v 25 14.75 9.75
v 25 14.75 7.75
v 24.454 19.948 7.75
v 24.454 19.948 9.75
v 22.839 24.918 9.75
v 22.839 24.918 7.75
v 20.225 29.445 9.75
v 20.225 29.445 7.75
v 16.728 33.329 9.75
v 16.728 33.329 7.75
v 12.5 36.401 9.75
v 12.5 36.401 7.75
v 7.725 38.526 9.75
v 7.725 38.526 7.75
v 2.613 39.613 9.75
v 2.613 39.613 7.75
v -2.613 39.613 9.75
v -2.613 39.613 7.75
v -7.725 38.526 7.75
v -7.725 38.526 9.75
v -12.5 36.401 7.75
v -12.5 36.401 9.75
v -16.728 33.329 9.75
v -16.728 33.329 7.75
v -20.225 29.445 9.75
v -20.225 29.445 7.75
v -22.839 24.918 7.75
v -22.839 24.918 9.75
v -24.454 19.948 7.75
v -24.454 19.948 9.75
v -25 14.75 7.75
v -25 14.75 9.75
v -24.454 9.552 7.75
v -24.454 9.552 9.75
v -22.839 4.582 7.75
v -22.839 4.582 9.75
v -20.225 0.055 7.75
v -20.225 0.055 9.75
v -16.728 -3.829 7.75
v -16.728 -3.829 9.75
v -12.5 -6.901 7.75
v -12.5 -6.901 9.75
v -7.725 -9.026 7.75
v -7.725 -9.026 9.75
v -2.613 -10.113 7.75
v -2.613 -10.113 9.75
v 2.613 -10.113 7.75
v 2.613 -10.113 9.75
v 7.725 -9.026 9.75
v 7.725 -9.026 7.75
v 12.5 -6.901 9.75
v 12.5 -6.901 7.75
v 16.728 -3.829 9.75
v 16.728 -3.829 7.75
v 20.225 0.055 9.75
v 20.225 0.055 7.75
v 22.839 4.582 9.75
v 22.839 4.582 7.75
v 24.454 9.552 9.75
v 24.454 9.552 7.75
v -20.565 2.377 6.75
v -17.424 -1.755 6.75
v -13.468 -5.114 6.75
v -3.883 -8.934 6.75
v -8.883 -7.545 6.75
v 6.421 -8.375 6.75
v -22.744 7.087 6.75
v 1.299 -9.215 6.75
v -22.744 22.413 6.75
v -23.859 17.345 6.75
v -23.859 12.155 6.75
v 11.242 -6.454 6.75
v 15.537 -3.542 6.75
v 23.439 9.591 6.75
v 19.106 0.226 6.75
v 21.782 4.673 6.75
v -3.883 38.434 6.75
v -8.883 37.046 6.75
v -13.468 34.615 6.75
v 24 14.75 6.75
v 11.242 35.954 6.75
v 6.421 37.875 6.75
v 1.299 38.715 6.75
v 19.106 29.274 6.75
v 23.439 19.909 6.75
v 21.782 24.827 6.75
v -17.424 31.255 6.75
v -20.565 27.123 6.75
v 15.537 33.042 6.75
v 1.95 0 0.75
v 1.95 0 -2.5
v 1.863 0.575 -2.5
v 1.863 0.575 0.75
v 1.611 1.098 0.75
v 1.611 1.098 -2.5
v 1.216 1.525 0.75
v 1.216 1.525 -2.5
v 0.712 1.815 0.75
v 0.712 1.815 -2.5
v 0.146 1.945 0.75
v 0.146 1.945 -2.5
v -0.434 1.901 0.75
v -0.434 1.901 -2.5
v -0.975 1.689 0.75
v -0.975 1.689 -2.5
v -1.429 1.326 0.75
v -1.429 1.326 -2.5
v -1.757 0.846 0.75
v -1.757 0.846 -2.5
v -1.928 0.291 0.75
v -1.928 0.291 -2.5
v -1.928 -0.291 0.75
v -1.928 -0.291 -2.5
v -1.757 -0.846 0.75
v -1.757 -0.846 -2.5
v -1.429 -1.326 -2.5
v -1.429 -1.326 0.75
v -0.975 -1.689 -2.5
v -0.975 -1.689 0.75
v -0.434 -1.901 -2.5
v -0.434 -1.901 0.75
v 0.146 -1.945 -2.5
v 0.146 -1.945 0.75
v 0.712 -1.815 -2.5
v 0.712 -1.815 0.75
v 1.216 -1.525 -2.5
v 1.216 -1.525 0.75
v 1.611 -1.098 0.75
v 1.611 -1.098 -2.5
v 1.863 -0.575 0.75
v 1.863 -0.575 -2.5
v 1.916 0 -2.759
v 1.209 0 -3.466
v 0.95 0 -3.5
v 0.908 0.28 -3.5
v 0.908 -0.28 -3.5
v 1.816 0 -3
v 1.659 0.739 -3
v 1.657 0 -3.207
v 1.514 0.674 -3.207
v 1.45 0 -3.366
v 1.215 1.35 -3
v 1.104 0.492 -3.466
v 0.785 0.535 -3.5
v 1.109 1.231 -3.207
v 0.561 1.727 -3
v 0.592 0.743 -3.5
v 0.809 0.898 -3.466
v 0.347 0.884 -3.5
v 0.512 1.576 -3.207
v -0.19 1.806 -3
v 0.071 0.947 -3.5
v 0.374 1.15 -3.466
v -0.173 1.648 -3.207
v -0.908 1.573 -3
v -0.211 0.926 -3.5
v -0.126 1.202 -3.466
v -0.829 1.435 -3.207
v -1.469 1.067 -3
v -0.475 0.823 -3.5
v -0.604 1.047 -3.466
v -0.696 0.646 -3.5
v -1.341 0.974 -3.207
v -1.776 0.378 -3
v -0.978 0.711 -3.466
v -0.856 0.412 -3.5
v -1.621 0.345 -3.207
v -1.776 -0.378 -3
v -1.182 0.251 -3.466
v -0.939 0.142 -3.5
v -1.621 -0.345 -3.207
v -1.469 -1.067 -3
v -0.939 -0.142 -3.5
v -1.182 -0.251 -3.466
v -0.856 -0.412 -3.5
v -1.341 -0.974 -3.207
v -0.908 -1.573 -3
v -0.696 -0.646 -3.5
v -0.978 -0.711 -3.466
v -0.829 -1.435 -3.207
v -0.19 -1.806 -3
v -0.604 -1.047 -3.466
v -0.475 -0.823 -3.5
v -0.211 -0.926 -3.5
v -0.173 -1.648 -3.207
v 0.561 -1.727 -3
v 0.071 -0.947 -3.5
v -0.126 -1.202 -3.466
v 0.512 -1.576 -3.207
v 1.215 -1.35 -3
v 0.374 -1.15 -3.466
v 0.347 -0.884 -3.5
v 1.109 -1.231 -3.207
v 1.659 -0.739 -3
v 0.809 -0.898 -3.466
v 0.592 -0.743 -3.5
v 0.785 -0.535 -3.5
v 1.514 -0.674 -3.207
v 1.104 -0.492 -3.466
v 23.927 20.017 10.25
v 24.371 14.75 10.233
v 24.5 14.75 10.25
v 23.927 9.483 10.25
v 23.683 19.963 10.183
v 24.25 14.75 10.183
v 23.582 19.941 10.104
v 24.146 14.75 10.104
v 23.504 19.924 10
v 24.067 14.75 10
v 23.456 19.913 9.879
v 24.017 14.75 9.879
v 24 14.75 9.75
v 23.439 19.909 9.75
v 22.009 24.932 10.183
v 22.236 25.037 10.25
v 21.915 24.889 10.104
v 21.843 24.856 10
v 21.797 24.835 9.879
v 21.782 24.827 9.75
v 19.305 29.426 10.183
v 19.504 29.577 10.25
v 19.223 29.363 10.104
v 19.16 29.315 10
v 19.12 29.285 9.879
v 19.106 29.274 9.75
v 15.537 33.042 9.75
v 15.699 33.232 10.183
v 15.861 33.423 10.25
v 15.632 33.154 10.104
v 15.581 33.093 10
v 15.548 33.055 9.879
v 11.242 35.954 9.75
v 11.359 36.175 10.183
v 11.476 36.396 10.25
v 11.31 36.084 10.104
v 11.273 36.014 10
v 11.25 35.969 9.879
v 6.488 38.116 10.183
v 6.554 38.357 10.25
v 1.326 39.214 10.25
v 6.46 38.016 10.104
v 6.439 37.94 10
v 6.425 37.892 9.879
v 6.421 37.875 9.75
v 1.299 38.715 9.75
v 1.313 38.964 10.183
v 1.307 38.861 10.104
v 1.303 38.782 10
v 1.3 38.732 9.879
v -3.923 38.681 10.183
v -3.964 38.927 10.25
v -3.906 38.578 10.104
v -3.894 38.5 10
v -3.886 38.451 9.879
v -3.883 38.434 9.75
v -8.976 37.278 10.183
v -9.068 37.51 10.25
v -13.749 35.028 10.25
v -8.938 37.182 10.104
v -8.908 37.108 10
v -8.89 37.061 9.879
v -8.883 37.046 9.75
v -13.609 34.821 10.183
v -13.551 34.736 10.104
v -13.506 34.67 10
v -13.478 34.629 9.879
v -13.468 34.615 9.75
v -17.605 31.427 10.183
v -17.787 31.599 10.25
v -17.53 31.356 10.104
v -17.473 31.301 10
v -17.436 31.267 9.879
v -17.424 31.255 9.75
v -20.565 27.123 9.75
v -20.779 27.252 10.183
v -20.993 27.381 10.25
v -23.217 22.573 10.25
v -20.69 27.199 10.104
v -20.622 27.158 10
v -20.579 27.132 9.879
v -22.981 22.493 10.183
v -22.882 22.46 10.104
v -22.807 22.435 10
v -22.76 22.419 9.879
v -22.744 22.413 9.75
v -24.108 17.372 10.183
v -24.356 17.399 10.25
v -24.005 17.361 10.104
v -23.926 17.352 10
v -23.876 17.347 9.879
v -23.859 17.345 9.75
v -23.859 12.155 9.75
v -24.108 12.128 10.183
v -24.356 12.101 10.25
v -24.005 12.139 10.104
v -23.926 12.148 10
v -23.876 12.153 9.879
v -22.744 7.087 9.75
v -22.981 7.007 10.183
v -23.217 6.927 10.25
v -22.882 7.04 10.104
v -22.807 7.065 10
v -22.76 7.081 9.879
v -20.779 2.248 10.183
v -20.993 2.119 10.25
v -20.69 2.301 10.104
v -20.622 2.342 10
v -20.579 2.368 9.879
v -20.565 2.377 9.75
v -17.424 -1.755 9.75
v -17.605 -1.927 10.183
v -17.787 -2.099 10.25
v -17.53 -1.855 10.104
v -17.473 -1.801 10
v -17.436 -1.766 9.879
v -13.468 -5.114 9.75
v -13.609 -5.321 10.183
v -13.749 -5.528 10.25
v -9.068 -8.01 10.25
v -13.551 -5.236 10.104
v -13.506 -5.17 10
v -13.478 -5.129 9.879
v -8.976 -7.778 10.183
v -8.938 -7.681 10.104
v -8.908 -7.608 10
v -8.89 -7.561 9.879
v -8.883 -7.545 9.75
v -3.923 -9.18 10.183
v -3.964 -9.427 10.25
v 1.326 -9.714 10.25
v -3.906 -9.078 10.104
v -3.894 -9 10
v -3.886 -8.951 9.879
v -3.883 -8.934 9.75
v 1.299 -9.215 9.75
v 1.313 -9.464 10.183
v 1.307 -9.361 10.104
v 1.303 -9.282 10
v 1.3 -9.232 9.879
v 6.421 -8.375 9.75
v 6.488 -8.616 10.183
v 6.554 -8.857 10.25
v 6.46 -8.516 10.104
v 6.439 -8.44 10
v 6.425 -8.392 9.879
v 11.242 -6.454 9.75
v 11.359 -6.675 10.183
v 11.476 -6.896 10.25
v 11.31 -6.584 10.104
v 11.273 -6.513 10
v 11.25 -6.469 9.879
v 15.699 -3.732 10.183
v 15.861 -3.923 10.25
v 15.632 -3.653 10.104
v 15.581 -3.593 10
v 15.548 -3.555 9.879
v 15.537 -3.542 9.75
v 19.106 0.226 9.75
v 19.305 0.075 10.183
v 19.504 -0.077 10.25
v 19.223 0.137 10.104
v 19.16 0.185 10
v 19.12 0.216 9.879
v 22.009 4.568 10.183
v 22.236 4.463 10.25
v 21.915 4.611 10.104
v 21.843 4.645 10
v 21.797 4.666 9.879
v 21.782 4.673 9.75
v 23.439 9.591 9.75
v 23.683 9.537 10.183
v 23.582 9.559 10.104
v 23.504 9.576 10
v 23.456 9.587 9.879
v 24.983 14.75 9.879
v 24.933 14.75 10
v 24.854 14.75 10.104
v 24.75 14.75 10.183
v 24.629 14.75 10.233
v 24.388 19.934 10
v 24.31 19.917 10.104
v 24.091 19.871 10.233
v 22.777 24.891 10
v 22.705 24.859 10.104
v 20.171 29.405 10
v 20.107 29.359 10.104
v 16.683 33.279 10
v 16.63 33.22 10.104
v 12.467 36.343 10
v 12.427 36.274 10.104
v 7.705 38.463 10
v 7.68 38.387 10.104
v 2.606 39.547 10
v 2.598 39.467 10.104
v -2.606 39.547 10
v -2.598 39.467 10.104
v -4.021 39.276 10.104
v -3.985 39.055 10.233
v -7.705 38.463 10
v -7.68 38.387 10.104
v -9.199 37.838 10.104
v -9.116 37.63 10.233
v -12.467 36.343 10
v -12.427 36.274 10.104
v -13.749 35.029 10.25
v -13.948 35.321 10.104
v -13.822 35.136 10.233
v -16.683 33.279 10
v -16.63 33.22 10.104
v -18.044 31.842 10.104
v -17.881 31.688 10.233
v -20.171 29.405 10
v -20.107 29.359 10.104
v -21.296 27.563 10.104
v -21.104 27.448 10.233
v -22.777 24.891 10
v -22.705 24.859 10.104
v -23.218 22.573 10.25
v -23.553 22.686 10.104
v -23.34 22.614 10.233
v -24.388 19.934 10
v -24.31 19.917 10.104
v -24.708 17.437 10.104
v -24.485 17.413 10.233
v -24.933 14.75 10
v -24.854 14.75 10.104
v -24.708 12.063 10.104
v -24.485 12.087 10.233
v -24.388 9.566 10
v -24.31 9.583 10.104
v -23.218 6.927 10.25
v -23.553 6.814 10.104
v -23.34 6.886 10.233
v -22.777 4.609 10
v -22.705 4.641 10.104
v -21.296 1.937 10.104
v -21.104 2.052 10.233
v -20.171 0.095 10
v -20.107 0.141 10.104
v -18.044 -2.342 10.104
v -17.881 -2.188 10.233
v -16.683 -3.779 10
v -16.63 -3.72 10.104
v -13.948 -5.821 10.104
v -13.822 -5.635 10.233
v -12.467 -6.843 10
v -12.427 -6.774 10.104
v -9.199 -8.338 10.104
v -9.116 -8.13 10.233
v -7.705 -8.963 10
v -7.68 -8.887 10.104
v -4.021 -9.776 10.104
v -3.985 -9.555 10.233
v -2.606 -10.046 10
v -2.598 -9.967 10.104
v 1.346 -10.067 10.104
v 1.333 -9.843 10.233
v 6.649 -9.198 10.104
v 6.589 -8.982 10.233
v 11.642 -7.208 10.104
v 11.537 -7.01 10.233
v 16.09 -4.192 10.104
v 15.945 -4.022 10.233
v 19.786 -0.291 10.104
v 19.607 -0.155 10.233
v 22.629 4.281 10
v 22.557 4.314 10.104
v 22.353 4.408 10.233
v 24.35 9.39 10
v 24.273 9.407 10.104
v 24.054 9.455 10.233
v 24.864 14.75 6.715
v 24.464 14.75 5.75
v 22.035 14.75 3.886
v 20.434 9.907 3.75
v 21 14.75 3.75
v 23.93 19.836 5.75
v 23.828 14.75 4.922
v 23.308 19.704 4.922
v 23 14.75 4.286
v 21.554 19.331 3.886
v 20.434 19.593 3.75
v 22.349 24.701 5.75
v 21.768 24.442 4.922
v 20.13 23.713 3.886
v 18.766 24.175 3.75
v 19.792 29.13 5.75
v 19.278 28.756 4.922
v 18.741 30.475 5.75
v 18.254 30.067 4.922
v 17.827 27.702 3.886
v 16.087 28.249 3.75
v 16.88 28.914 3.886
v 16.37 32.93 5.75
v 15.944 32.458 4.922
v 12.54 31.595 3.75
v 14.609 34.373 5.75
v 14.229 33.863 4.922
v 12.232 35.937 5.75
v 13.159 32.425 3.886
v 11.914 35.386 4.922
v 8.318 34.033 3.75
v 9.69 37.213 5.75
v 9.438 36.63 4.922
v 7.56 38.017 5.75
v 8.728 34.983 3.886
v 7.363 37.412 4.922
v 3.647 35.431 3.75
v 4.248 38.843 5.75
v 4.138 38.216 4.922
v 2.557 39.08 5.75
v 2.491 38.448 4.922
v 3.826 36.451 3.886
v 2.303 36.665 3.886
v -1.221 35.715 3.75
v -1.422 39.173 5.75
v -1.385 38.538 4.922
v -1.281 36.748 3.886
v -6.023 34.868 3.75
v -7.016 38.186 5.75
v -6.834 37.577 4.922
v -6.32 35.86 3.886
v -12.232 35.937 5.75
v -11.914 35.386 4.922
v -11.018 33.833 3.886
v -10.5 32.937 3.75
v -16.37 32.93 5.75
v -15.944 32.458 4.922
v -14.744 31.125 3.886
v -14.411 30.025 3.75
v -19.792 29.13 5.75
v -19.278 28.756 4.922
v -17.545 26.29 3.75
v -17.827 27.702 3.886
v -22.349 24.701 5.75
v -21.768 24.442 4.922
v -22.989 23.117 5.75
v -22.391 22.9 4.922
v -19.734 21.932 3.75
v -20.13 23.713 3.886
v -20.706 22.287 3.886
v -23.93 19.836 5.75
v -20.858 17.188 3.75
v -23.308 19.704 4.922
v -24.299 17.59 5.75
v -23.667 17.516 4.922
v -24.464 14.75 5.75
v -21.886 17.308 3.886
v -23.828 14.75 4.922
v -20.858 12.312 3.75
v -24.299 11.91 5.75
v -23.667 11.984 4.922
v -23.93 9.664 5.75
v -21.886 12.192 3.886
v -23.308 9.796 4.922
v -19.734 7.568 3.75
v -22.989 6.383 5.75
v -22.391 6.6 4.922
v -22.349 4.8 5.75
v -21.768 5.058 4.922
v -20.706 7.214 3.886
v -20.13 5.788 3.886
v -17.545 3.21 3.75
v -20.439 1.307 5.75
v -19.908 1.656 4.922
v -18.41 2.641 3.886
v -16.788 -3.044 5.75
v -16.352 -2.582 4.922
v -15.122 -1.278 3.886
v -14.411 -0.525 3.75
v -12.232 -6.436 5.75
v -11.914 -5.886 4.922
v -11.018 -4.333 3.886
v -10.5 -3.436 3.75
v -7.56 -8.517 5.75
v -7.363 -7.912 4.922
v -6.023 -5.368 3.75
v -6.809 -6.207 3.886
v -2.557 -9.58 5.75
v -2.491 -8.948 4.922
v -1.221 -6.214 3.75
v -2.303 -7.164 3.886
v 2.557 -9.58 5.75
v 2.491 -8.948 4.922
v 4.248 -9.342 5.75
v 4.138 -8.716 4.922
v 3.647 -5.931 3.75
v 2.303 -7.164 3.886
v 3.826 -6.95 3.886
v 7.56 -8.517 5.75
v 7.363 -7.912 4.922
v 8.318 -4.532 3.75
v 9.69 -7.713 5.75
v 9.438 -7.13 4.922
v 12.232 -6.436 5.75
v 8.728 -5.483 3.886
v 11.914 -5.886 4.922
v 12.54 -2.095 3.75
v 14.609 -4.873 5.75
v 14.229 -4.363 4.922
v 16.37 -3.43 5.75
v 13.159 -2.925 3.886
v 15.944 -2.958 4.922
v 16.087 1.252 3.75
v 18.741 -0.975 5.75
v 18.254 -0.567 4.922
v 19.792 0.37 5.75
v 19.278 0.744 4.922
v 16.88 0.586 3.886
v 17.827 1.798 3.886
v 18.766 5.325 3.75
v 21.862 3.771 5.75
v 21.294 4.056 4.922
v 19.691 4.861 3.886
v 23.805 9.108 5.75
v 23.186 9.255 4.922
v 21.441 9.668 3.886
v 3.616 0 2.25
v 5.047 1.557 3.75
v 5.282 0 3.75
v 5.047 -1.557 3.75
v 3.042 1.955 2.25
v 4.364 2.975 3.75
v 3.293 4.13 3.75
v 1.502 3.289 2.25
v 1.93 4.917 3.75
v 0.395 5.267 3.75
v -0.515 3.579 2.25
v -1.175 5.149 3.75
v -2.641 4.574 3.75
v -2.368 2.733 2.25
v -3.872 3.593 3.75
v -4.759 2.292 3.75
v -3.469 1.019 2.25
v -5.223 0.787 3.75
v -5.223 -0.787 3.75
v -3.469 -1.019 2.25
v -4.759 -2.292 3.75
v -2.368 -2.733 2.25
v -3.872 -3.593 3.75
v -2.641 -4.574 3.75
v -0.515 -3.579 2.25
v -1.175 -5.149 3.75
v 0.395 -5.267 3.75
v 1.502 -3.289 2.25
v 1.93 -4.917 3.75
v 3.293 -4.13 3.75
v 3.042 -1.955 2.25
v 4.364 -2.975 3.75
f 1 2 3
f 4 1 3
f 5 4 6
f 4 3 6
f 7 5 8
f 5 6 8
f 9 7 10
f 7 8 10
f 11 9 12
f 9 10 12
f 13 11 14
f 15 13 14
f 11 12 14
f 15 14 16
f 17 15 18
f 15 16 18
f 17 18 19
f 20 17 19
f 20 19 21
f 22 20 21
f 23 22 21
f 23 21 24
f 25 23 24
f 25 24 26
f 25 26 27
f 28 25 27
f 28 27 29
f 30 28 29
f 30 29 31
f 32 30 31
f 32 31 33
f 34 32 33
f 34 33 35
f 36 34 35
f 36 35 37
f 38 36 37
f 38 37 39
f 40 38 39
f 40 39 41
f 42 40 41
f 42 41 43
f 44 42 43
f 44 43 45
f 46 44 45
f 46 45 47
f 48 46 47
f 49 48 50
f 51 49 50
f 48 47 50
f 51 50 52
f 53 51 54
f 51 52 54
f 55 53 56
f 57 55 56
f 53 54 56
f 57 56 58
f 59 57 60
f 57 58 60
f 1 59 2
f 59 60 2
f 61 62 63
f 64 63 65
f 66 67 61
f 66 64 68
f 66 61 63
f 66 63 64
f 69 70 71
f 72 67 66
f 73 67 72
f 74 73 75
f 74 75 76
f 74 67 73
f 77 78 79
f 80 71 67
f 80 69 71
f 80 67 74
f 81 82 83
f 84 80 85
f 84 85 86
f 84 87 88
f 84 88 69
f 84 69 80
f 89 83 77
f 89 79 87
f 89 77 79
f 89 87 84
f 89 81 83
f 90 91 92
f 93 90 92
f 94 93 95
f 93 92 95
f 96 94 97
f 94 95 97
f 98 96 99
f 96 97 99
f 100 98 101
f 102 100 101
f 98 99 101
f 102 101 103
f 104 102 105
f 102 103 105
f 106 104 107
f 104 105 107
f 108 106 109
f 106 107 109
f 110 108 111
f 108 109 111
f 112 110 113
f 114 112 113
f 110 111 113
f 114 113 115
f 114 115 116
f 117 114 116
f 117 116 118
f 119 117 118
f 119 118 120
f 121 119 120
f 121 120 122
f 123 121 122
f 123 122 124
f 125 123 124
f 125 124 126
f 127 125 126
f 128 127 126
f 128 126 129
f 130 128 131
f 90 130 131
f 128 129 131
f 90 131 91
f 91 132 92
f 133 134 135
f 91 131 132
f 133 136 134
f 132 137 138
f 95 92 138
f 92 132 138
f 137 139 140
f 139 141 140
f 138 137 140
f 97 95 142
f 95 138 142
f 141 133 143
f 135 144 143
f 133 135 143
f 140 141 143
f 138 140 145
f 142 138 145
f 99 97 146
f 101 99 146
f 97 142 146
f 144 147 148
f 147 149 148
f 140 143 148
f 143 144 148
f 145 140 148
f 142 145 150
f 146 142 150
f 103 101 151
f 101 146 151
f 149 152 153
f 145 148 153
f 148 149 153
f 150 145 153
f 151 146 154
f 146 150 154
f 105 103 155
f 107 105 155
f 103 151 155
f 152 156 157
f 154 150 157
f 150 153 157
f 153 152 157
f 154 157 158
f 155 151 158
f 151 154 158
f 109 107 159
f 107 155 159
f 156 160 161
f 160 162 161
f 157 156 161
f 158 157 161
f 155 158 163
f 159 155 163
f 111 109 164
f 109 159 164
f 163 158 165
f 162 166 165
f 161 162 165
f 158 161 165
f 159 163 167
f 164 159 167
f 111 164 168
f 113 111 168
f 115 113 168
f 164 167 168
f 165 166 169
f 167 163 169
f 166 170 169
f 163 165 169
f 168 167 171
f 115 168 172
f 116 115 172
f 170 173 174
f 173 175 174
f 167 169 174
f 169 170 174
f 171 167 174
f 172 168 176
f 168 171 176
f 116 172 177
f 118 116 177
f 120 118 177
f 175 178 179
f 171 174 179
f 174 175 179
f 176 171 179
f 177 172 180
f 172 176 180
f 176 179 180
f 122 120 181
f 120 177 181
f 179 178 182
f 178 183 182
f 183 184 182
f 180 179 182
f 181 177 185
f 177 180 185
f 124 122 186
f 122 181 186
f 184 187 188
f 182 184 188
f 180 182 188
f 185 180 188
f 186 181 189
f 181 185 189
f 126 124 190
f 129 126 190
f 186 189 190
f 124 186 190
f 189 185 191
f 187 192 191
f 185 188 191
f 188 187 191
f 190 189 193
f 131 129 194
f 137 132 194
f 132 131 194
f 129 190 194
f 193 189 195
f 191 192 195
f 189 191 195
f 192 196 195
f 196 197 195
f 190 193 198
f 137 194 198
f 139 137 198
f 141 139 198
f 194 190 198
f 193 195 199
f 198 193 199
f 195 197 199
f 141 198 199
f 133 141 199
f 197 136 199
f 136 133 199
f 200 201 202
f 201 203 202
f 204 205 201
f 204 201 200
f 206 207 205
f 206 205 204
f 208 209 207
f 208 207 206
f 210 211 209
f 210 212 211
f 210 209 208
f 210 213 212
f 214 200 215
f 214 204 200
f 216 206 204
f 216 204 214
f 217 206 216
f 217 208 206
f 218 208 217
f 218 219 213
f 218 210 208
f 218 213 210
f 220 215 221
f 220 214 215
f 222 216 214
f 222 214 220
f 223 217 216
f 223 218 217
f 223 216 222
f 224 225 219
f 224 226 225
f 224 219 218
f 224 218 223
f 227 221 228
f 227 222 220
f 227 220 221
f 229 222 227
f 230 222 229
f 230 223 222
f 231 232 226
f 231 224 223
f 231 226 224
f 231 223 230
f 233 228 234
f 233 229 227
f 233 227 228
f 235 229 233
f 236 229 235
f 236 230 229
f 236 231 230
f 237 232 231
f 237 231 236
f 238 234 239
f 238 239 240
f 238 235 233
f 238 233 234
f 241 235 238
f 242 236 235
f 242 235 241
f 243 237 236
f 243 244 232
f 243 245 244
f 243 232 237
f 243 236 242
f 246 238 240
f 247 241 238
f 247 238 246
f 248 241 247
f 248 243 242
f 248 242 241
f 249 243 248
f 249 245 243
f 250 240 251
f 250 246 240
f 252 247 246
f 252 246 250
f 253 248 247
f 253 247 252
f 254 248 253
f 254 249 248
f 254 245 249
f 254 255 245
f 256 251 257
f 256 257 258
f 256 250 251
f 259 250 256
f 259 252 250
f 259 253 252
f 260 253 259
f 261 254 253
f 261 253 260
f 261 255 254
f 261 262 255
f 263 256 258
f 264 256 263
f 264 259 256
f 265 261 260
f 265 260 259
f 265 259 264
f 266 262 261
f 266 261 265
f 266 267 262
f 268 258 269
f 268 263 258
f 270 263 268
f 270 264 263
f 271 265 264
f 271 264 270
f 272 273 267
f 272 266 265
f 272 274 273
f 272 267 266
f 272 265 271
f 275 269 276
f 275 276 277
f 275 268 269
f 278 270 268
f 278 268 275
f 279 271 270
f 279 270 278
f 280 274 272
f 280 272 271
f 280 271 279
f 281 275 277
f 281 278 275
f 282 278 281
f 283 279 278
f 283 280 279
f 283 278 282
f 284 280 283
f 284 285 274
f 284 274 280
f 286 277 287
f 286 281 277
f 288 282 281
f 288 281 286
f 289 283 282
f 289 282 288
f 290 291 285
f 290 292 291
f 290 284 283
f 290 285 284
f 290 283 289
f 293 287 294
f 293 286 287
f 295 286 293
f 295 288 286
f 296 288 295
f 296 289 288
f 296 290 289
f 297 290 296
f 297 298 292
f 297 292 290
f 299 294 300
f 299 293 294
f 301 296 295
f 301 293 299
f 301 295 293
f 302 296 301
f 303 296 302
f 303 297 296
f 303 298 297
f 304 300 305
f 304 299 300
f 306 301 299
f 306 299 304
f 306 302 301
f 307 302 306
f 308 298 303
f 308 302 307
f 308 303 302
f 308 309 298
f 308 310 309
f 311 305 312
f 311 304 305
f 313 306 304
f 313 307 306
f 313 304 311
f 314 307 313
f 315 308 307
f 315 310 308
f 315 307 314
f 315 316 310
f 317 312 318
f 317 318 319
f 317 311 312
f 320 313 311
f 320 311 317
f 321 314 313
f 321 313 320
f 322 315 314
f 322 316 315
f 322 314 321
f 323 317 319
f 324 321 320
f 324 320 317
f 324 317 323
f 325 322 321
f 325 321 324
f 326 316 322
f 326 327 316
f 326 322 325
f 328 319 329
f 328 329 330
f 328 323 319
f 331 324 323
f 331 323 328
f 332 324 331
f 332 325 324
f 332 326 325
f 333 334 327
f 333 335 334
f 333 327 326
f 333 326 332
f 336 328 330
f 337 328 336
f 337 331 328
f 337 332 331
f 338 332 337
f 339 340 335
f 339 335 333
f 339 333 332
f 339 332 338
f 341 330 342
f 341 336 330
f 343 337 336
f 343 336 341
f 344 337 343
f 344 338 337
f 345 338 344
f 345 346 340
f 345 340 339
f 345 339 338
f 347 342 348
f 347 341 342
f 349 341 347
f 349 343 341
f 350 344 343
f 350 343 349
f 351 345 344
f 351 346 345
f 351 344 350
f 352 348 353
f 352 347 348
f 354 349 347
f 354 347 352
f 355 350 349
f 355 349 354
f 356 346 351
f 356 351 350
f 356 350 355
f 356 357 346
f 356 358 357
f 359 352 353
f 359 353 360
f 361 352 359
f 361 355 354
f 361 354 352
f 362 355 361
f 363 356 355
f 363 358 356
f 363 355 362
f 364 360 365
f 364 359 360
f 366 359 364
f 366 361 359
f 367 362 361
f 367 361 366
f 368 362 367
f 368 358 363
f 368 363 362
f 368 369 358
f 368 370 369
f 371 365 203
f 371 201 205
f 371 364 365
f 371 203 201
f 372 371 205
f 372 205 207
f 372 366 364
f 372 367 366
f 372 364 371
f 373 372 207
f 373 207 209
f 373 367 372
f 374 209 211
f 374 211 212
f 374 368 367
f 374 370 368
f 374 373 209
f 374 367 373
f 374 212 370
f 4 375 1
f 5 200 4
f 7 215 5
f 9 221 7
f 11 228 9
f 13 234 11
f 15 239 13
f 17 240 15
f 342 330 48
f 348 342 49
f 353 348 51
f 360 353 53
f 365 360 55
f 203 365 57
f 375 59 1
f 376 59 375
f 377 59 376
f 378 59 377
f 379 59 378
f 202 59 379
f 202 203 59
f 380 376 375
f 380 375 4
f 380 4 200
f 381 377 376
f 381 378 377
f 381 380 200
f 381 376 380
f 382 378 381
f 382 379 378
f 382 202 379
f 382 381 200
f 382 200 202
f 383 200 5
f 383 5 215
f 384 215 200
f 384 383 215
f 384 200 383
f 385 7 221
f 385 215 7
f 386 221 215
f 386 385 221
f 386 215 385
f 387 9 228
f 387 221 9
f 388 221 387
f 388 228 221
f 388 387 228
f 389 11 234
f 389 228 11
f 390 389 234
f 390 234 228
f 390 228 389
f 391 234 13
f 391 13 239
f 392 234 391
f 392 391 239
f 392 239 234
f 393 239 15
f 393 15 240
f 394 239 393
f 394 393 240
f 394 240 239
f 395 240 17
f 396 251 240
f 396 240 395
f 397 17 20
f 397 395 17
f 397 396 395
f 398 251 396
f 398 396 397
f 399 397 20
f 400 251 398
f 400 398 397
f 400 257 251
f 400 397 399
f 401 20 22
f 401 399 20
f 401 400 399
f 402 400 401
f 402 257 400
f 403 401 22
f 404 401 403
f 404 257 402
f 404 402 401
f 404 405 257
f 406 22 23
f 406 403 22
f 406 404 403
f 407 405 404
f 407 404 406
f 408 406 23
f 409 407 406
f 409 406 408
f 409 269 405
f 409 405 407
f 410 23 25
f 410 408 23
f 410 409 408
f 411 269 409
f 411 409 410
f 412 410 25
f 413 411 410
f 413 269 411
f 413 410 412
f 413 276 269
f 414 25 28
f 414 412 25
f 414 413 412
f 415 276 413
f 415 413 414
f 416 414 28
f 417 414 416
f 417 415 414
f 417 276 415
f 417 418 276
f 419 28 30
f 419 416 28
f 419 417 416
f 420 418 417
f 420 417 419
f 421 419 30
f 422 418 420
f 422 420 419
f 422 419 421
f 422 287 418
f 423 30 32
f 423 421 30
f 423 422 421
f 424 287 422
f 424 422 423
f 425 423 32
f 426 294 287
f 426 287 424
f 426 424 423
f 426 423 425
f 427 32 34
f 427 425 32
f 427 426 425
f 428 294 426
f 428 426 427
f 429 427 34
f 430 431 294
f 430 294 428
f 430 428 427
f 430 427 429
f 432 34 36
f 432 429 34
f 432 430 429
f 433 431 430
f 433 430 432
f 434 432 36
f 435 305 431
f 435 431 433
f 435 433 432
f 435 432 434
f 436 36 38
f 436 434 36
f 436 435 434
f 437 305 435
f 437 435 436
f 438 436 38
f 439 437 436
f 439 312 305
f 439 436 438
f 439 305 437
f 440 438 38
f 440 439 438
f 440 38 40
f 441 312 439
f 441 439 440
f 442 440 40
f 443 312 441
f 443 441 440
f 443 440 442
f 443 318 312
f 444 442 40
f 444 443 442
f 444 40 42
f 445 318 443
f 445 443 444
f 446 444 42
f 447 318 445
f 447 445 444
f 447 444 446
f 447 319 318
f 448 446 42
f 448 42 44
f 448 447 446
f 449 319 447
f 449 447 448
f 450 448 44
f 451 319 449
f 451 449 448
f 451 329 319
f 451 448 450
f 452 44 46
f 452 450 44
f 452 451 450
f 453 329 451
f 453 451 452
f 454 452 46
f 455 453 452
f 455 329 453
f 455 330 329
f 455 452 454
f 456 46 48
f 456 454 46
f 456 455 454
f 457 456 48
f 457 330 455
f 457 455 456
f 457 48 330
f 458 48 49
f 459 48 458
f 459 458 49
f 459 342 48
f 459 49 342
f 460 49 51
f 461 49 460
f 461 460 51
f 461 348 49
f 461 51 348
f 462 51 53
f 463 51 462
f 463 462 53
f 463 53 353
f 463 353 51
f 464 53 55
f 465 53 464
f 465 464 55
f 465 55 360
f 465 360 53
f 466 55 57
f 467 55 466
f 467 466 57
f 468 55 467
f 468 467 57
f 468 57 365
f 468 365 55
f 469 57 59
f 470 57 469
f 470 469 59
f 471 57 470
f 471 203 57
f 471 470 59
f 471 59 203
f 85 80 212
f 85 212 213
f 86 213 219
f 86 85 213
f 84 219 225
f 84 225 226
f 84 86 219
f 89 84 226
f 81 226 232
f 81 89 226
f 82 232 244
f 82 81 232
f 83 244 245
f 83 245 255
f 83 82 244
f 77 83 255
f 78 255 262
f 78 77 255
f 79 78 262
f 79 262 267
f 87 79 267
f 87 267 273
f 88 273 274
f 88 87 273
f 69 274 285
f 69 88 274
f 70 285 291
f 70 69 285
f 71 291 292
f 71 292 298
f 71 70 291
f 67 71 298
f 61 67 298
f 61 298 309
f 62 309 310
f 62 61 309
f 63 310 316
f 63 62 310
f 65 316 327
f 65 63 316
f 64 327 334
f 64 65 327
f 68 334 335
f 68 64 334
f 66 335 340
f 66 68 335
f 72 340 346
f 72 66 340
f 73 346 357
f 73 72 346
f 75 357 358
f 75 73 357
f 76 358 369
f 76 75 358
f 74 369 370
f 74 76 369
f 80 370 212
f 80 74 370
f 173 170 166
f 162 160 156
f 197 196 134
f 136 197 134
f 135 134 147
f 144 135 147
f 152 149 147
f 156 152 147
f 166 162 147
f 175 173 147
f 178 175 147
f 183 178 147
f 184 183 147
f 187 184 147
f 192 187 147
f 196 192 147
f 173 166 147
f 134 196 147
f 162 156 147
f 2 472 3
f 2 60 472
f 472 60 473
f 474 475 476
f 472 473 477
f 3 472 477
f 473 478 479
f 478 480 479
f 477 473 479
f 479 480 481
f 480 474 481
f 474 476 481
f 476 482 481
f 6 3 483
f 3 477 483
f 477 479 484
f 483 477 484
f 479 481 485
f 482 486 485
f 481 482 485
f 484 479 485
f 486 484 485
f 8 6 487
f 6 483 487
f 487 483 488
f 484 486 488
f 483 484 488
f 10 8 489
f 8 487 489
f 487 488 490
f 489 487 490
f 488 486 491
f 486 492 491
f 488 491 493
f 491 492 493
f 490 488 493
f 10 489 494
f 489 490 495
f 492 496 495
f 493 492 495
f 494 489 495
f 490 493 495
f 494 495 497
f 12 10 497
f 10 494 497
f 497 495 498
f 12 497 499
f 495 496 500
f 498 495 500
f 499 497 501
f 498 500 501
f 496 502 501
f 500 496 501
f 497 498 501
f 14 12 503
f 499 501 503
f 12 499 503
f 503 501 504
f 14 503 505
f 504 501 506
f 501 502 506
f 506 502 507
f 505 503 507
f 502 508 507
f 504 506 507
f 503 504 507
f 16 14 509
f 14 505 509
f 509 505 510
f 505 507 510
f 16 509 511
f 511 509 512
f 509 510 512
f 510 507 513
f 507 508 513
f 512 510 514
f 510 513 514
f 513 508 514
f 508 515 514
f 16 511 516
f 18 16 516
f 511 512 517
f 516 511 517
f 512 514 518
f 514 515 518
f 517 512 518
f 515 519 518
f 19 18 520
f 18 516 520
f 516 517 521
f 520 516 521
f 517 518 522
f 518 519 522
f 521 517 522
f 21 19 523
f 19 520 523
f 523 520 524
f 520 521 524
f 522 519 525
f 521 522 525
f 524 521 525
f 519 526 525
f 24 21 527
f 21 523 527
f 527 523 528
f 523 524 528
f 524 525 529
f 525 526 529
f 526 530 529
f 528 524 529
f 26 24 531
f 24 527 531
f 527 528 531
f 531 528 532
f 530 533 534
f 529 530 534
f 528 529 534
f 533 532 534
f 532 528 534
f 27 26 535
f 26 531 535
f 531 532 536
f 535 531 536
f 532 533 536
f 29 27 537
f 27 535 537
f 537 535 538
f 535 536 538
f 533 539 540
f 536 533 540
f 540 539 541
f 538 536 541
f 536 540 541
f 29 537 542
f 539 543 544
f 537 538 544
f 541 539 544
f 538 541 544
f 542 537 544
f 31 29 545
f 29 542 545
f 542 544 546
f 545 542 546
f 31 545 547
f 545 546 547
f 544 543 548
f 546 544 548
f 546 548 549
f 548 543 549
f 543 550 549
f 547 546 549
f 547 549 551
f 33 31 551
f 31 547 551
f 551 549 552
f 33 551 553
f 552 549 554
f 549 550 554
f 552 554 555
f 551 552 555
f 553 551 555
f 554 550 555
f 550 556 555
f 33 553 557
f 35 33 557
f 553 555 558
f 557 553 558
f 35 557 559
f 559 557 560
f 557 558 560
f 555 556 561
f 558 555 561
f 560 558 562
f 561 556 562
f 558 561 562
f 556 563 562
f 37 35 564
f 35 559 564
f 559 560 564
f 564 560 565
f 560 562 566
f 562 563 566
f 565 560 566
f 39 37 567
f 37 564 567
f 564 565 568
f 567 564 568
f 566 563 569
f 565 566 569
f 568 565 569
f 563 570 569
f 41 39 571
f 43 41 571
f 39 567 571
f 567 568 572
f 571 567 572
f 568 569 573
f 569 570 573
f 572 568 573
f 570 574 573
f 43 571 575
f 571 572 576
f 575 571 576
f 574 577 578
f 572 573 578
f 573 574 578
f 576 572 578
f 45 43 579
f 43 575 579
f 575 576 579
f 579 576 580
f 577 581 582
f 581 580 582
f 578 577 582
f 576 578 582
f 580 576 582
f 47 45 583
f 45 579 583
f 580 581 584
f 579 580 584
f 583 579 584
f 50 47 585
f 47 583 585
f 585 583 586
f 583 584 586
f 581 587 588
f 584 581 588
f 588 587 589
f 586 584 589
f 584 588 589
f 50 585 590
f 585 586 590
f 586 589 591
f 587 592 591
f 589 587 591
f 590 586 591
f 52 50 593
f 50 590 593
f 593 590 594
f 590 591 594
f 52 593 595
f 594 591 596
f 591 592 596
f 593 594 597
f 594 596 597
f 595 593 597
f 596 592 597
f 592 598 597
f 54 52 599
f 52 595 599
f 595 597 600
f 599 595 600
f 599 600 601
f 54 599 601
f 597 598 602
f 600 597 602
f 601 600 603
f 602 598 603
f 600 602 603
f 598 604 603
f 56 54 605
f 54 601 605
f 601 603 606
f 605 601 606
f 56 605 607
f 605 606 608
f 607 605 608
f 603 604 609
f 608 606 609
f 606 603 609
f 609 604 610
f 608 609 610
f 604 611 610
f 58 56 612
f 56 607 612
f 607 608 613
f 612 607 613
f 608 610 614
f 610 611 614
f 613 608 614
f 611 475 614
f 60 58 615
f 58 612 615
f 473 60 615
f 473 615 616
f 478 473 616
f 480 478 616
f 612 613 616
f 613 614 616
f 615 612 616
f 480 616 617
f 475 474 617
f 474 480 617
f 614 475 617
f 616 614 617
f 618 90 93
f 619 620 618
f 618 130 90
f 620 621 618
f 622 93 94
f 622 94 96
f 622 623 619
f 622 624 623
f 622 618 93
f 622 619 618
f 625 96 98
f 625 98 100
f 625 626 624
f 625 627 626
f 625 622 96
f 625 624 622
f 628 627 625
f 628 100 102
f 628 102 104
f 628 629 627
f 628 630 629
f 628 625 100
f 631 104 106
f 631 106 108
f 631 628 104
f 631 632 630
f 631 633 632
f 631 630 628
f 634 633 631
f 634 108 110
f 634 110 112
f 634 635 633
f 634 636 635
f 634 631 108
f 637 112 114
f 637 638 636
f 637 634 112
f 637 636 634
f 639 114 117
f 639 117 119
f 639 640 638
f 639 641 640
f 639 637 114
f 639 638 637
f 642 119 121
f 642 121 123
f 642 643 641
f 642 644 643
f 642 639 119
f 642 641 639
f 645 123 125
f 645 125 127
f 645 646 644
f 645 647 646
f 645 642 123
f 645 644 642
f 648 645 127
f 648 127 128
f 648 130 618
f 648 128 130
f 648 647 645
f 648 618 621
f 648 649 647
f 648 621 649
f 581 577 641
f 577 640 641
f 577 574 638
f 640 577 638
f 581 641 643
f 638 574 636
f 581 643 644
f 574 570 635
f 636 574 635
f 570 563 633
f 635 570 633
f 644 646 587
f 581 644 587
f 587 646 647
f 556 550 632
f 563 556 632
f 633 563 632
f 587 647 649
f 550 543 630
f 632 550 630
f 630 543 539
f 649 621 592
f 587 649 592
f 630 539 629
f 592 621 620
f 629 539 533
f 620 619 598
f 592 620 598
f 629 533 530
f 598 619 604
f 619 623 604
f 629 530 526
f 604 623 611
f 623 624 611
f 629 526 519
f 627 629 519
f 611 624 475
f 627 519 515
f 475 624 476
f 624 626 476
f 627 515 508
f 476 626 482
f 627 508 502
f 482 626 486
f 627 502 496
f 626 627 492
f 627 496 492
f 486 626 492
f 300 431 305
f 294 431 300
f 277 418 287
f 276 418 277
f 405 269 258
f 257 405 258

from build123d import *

# Parameters (mm, degrees)
BOSS_EXTRUDE1_DEPTH      = 3.75
BOSS_EXTRUDE1_DEPTH_BACK = 3.5
SKETCH1_R                = 1.95
SKETCH2_R                = 25
BOSS_EXTRUDE2_DEPTH      = 3
SKETCH3_R                = 25
SKETCH3_R_2              = 24
BOSS_EXTRUDE3_DEPTH      = 3.5
FILLET1_R                = 0.5
FILLET2_R                = 4
CHAMFER1_SIZE            = 3
CHAMFER1_SIZE2           = 3.331837544
FILLET3_R                = 1


with BuildPart() as part:
    # Sketch1 → Boss-Extrude1 (new, two sides: drawn at the far end of the back side and taken through both)
    with BuildSketch(Plane.XY.offset(-BOSS_EXTRUDE1_DEPTH_BACK)):
        Circle(SKETCH1_R)
    extrude(amount=BOSS_EXTRUDE1_DEPTH + BOSS_EXTRUDE1_DEPTH_BACK)

    # Sketch2 → Boss-Extrude2 (add)
    with BuildSketch(Plane.XY.offset(3.75)):
        with Locations((0, 14.750067334)):
            Circle(SKETCH2_R)
    extrude(amount=BOSS_EXTRUDE2_DEPTH)

    # Sketch3 → Boss-Extrude3 (add)
    with BuildSketch(Plane.XY.offset(6.75)):
        with Locations((0, 14.750067334)):
            Circle(SKETCH3_R)
        with Locations((0, 14.750067334)):
            Circle(SKETCH3_R_2, mode=Mode.SUBTRACT)
    extrude(amount=BOSS_EXTRUDE3_DEPTH)

    # Fillet1
    fillet1_edges = [part.edges().sort_by_distance(p)[0] for p in [
        (-25, 14.750067334, 10.25),
        (-24, 14.750067334, 10.25),
    ]]
    fillet(fillet1_edges, radius=FILLET1_R - 0.0001)  # a hair under: the kernel refuses the full size

    # Fillet2
    fillet2_edges = [part.edges().sort_by_distance(p)[0] for p in [
        (-25, 14.750067334, 3.75),
    ]]
    fillet(fillet2_edges, radius=FILLET2_R)

    # Chamfer1
    chamfer1_edges = [part.edges().sort_by_distance(p)[0] for p in [
        (-1.95, 0, 3.75),
    ]]
    chamfer1_side = [part.faces().sort_by_distance(p)[0] for p in [
        (-1.95, 0, 1.875),
    ]]
    chamfer(chamfer1_edges, length=CHAMFER1_SIZE, length2=CHAMFER1_SIZE2, reference=chamfer1_side[0])

    # Fillet3
    fillet3_edges = [part.edges().sort_by_distance(p)[0] for p in [
        (-1.95, 0, -3.5),
    ]]
    fillet(fillet3_edges, radius=FILLET3_R)


solid = part.part
